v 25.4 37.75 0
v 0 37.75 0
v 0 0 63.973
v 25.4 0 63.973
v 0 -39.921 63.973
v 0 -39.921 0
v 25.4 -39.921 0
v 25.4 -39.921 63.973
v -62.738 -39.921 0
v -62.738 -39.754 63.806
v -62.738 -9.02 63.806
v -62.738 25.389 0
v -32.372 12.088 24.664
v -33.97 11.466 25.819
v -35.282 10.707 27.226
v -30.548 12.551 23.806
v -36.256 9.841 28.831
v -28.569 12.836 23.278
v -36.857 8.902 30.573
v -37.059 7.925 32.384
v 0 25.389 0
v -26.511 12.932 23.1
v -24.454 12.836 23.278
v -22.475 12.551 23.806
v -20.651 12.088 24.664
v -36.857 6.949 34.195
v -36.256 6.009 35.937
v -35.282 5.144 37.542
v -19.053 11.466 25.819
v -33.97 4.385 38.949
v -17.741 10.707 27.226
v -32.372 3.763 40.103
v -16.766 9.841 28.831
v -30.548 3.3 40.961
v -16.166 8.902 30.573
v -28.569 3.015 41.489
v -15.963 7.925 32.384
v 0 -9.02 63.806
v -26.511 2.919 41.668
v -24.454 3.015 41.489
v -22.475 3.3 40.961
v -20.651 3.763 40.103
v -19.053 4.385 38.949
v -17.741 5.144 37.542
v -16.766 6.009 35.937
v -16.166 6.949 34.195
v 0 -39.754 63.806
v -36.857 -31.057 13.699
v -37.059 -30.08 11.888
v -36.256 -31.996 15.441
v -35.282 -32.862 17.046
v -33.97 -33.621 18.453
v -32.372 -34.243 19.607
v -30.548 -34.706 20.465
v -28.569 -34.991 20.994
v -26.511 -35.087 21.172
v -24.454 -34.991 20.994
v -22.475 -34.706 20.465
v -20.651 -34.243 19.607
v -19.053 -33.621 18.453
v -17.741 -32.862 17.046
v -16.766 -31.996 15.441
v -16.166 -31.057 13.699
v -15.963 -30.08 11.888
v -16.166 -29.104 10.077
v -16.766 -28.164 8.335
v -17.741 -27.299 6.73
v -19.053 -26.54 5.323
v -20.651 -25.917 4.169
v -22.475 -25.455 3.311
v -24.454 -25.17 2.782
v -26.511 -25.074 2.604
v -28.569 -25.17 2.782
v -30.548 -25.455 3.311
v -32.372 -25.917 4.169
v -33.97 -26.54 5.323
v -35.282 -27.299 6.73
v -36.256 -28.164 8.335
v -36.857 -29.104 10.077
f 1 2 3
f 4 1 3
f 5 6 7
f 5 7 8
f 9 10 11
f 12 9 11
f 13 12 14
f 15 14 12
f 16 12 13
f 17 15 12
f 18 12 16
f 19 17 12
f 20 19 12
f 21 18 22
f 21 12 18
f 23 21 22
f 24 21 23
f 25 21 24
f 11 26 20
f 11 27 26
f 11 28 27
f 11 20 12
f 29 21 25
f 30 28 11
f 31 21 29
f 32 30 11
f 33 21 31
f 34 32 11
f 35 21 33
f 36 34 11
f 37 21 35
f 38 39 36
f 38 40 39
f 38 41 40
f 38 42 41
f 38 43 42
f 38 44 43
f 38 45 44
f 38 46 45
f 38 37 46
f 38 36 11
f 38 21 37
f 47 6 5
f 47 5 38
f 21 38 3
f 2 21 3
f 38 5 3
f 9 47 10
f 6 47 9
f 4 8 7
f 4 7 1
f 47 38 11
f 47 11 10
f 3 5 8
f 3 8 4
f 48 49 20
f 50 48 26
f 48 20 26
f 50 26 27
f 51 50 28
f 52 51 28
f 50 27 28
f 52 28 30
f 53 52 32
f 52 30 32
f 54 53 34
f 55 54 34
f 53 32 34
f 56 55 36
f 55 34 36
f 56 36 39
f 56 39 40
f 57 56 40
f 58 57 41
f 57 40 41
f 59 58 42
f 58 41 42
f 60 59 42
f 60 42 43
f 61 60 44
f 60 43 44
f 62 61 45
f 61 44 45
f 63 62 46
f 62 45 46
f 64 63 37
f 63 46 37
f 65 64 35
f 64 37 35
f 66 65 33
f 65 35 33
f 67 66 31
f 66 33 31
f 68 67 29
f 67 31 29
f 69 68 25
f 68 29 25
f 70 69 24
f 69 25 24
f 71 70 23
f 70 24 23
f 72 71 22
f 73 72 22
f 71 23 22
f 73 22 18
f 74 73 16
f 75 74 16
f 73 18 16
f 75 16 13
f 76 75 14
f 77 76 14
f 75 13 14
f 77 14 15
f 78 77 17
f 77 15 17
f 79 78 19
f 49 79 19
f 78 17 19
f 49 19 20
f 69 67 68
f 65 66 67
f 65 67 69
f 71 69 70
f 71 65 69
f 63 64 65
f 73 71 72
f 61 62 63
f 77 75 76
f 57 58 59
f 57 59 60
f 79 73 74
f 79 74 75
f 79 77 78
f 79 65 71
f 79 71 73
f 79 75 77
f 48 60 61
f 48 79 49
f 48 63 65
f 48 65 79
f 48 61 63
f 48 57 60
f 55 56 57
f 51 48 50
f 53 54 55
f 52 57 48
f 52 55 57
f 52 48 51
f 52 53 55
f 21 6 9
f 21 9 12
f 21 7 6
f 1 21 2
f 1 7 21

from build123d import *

# Parameters (mm, degrees)
F0_W     = 39.9214811623
F0_H     = 63.9728531241
F1_DEPTH = 25.4
F3_DEPTH = 62.738
F4_R     = 10.5479626422
F5_DEPTH = 43.18


with BuildPart() as f1:
    # F0 (on Right) → F1 (new body)
    with BuildSketch(Plane.YZ):
        with Locations((-19.9607405812, 31.9864265621)):
            Rectangle(F0_W, F0_H)
        Polygon((0, 63.9728531241), (0, 0), (37.7500206232, 0), align=None)
    extrude(amount=F1_DEPTH)

    # F2 (on Right) → F3 (join)
    with BuildSketch(Plane.YZ):
        Polygon((-39.7544465959, 63.8058185577), (-39.9214811623, 0), (25.3893956542, 0), (-9.0199168772, 63.8058185577), align=None)
    extrude(amount=-F3_DEPTH)

    # F4 (on face) → F5 (cut)
    with BuildSketch(Plane(origin=(0, 19.6691261726, 10.6072004872), x_dir=(-1, 0, 0), z_dir=(0, 0.8801695735, 0.4746593746))):
        with Locations((26.5113729984, 24.7412994504)):
            Circle(F4_R)
    extrude(amount=-F5_DEPTH, mode=Mode.SUBTRACT)


solid = f1.part
